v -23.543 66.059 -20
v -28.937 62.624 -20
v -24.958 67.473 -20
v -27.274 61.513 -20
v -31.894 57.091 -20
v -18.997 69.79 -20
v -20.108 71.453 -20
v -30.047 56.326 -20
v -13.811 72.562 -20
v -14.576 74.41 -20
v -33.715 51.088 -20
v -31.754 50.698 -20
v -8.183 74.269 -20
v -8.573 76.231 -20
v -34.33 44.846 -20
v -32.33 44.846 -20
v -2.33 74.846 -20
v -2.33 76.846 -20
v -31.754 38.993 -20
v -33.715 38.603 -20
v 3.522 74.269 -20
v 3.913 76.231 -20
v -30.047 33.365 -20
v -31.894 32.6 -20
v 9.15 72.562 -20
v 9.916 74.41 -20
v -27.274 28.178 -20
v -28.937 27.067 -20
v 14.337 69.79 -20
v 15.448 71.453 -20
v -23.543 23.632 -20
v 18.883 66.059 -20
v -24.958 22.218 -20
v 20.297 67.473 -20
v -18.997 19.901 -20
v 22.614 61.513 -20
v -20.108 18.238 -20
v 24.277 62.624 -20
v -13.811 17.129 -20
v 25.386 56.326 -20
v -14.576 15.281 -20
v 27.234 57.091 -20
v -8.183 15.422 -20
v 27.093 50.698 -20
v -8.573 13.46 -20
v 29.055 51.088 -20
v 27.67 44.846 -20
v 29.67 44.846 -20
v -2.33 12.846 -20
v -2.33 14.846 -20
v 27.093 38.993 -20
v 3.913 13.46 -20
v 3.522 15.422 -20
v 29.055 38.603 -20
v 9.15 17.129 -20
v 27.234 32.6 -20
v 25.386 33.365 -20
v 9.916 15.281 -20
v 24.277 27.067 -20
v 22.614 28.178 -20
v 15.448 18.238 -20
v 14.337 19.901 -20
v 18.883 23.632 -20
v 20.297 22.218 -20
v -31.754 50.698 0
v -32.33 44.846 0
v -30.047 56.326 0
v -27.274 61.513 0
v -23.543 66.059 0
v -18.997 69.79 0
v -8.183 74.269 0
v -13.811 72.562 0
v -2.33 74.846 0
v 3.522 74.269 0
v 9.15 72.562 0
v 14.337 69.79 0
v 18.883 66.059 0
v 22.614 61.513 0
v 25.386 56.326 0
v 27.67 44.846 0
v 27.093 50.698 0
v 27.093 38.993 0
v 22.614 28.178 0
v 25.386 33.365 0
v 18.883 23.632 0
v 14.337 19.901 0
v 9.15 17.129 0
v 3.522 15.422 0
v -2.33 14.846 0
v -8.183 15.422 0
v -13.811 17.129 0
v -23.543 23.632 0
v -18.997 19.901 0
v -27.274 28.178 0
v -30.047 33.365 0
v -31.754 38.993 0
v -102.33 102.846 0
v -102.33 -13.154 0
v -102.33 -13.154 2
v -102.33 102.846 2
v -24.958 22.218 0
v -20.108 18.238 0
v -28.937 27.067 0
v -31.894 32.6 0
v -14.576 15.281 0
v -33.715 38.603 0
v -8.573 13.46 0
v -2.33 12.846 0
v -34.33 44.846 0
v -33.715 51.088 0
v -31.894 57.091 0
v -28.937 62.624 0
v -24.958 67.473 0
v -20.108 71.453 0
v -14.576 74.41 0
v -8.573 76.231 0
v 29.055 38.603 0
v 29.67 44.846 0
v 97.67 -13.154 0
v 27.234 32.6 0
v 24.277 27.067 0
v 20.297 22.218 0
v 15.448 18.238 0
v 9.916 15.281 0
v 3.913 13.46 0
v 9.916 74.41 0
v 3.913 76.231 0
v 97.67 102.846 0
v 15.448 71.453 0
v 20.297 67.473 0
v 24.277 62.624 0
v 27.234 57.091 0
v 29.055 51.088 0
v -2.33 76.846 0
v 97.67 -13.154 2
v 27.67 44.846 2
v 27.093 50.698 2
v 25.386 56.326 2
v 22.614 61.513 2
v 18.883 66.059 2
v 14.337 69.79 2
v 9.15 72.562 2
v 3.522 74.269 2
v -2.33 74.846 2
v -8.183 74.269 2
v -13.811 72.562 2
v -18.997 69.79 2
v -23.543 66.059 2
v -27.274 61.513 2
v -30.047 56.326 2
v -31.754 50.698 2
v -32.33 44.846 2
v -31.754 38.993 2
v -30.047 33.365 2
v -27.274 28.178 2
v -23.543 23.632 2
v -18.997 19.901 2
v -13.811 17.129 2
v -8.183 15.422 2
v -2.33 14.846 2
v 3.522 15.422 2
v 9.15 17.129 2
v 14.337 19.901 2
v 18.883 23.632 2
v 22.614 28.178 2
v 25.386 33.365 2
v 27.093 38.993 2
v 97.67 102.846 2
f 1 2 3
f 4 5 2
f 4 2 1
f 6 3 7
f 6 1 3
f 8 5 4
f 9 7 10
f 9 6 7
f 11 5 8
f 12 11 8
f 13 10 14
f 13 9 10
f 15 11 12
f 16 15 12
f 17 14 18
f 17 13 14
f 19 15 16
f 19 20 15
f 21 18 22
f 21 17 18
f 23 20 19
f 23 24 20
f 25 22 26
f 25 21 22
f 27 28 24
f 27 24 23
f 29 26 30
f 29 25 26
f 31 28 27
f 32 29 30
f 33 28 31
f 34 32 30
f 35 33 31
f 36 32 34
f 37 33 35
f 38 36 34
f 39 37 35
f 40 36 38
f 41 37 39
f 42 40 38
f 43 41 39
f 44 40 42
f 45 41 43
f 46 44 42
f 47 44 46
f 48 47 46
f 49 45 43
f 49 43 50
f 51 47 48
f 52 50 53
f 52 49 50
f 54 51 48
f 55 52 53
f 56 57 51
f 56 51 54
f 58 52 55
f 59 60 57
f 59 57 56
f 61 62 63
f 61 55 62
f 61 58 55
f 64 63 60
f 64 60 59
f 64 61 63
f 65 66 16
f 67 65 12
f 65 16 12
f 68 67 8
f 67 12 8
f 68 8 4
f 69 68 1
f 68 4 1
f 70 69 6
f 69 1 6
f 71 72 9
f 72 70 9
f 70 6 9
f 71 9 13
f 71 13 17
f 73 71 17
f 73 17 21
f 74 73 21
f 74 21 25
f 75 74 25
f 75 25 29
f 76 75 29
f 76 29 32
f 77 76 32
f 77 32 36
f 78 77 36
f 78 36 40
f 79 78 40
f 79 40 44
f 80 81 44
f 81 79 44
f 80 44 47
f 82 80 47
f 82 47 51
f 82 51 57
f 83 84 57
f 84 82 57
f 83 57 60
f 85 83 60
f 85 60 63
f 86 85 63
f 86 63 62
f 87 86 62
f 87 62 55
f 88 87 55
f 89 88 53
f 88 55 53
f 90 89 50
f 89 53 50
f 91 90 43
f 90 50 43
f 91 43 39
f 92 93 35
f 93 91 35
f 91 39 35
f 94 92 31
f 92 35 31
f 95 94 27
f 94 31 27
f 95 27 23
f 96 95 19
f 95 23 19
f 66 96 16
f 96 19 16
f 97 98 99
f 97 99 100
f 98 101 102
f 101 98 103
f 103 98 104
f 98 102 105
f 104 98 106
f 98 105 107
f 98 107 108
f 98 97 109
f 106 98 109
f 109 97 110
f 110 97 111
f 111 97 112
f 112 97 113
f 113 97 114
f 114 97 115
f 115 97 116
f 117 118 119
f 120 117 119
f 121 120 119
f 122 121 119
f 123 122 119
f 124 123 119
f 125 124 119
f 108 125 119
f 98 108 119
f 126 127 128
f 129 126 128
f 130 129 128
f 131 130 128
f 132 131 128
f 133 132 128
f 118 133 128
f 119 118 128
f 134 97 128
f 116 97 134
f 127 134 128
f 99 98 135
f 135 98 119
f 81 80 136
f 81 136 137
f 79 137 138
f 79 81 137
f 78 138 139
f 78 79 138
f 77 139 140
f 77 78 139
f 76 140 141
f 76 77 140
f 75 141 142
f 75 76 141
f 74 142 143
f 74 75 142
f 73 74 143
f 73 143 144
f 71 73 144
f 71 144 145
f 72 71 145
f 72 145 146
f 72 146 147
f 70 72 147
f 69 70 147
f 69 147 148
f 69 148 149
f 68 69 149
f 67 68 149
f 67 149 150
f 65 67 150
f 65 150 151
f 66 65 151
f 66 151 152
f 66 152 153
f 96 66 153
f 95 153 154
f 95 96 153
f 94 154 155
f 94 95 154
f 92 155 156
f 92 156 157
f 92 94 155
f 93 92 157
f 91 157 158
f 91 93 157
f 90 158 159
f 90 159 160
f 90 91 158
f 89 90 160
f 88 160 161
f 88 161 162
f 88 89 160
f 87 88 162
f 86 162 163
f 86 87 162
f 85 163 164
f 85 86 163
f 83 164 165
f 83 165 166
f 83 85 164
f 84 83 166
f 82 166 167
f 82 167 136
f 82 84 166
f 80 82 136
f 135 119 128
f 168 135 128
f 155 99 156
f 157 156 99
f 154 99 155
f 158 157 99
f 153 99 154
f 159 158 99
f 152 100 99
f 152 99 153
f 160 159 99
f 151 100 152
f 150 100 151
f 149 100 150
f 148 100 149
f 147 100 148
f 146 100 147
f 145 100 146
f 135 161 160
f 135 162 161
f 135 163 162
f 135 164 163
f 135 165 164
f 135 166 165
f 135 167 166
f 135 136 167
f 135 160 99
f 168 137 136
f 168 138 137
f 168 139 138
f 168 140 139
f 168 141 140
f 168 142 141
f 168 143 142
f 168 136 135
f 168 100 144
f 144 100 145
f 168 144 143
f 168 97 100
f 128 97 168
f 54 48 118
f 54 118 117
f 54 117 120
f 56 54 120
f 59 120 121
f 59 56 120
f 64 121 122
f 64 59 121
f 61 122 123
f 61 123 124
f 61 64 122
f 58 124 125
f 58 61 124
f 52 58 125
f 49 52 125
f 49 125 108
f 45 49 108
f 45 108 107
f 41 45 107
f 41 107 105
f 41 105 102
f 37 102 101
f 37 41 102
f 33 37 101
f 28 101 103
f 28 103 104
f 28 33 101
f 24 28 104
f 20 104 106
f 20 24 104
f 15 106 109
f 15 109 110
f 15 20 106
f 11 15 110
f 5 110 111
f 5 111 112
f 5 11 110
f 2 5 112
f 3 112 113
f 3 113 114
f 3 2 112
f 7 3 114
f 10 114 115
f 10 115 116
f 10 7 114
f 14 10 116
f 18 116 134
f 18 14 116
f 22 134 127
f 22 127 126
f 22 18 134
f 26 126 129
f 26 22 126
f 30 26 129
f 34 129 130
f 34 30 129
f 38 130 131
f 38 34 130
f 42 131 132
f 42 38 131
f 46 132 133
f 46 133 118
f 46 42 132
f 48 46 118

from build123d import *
from build123d.topology import SkipClean

# Parameters (mm, degrees)
SKETCH1_W           = 200
SKETCH1_H           = 116
SKETCH1_R           = 30
BOSS_EXTRUDE1_DEPTH = 2
BOSS_EXTRUDE2_START = 20
SKETCH2_R           = 32
SKETCH2_R_2         = 30
BOSS_EXTRUDE2_DEPTH = 20


with BuildPart() as part:
    # Sketch1 → Boss-Extrude1 (new body)
    with BuildSketch(Plane.XY):
        with Locations((-2.330233128, 44.845512274)):
            Rectangle(SKETCH1_W, SKETCH1_H)
        with Locations((-2.330233128, 44.845512274)):
            Circle(SKETCH1_R, mode=Mode.SUBTRACT)
    extrude(amount=BOSS_EXTRUDE1_DEPTH)

    # Sketch2 → Boss-Extrude2 (add)
    with SkipClean():  # the faces are left unmerged after this step: merging them gives an invalid solid
        with BuildSketch(Plane(origin=(0, 0, 0), x_dir=(-1, 0, 0), z_dir=(0, 0, -1)).offset(BOSS_EXTRUDE2_START)):
            with Locations(Location((2.330233128, 44.845512274, 0), (0, 0, 180))):
                Circle(SKETCH2_R)
            with Locations((2.330233128, 44.845512274)):
                Circle(SKETCH2_R_2, mode=Mode.SUBTRACT)
        extrude(amount=-BOSS_EXTRUDE2_DEPTH)


solid = part.part
